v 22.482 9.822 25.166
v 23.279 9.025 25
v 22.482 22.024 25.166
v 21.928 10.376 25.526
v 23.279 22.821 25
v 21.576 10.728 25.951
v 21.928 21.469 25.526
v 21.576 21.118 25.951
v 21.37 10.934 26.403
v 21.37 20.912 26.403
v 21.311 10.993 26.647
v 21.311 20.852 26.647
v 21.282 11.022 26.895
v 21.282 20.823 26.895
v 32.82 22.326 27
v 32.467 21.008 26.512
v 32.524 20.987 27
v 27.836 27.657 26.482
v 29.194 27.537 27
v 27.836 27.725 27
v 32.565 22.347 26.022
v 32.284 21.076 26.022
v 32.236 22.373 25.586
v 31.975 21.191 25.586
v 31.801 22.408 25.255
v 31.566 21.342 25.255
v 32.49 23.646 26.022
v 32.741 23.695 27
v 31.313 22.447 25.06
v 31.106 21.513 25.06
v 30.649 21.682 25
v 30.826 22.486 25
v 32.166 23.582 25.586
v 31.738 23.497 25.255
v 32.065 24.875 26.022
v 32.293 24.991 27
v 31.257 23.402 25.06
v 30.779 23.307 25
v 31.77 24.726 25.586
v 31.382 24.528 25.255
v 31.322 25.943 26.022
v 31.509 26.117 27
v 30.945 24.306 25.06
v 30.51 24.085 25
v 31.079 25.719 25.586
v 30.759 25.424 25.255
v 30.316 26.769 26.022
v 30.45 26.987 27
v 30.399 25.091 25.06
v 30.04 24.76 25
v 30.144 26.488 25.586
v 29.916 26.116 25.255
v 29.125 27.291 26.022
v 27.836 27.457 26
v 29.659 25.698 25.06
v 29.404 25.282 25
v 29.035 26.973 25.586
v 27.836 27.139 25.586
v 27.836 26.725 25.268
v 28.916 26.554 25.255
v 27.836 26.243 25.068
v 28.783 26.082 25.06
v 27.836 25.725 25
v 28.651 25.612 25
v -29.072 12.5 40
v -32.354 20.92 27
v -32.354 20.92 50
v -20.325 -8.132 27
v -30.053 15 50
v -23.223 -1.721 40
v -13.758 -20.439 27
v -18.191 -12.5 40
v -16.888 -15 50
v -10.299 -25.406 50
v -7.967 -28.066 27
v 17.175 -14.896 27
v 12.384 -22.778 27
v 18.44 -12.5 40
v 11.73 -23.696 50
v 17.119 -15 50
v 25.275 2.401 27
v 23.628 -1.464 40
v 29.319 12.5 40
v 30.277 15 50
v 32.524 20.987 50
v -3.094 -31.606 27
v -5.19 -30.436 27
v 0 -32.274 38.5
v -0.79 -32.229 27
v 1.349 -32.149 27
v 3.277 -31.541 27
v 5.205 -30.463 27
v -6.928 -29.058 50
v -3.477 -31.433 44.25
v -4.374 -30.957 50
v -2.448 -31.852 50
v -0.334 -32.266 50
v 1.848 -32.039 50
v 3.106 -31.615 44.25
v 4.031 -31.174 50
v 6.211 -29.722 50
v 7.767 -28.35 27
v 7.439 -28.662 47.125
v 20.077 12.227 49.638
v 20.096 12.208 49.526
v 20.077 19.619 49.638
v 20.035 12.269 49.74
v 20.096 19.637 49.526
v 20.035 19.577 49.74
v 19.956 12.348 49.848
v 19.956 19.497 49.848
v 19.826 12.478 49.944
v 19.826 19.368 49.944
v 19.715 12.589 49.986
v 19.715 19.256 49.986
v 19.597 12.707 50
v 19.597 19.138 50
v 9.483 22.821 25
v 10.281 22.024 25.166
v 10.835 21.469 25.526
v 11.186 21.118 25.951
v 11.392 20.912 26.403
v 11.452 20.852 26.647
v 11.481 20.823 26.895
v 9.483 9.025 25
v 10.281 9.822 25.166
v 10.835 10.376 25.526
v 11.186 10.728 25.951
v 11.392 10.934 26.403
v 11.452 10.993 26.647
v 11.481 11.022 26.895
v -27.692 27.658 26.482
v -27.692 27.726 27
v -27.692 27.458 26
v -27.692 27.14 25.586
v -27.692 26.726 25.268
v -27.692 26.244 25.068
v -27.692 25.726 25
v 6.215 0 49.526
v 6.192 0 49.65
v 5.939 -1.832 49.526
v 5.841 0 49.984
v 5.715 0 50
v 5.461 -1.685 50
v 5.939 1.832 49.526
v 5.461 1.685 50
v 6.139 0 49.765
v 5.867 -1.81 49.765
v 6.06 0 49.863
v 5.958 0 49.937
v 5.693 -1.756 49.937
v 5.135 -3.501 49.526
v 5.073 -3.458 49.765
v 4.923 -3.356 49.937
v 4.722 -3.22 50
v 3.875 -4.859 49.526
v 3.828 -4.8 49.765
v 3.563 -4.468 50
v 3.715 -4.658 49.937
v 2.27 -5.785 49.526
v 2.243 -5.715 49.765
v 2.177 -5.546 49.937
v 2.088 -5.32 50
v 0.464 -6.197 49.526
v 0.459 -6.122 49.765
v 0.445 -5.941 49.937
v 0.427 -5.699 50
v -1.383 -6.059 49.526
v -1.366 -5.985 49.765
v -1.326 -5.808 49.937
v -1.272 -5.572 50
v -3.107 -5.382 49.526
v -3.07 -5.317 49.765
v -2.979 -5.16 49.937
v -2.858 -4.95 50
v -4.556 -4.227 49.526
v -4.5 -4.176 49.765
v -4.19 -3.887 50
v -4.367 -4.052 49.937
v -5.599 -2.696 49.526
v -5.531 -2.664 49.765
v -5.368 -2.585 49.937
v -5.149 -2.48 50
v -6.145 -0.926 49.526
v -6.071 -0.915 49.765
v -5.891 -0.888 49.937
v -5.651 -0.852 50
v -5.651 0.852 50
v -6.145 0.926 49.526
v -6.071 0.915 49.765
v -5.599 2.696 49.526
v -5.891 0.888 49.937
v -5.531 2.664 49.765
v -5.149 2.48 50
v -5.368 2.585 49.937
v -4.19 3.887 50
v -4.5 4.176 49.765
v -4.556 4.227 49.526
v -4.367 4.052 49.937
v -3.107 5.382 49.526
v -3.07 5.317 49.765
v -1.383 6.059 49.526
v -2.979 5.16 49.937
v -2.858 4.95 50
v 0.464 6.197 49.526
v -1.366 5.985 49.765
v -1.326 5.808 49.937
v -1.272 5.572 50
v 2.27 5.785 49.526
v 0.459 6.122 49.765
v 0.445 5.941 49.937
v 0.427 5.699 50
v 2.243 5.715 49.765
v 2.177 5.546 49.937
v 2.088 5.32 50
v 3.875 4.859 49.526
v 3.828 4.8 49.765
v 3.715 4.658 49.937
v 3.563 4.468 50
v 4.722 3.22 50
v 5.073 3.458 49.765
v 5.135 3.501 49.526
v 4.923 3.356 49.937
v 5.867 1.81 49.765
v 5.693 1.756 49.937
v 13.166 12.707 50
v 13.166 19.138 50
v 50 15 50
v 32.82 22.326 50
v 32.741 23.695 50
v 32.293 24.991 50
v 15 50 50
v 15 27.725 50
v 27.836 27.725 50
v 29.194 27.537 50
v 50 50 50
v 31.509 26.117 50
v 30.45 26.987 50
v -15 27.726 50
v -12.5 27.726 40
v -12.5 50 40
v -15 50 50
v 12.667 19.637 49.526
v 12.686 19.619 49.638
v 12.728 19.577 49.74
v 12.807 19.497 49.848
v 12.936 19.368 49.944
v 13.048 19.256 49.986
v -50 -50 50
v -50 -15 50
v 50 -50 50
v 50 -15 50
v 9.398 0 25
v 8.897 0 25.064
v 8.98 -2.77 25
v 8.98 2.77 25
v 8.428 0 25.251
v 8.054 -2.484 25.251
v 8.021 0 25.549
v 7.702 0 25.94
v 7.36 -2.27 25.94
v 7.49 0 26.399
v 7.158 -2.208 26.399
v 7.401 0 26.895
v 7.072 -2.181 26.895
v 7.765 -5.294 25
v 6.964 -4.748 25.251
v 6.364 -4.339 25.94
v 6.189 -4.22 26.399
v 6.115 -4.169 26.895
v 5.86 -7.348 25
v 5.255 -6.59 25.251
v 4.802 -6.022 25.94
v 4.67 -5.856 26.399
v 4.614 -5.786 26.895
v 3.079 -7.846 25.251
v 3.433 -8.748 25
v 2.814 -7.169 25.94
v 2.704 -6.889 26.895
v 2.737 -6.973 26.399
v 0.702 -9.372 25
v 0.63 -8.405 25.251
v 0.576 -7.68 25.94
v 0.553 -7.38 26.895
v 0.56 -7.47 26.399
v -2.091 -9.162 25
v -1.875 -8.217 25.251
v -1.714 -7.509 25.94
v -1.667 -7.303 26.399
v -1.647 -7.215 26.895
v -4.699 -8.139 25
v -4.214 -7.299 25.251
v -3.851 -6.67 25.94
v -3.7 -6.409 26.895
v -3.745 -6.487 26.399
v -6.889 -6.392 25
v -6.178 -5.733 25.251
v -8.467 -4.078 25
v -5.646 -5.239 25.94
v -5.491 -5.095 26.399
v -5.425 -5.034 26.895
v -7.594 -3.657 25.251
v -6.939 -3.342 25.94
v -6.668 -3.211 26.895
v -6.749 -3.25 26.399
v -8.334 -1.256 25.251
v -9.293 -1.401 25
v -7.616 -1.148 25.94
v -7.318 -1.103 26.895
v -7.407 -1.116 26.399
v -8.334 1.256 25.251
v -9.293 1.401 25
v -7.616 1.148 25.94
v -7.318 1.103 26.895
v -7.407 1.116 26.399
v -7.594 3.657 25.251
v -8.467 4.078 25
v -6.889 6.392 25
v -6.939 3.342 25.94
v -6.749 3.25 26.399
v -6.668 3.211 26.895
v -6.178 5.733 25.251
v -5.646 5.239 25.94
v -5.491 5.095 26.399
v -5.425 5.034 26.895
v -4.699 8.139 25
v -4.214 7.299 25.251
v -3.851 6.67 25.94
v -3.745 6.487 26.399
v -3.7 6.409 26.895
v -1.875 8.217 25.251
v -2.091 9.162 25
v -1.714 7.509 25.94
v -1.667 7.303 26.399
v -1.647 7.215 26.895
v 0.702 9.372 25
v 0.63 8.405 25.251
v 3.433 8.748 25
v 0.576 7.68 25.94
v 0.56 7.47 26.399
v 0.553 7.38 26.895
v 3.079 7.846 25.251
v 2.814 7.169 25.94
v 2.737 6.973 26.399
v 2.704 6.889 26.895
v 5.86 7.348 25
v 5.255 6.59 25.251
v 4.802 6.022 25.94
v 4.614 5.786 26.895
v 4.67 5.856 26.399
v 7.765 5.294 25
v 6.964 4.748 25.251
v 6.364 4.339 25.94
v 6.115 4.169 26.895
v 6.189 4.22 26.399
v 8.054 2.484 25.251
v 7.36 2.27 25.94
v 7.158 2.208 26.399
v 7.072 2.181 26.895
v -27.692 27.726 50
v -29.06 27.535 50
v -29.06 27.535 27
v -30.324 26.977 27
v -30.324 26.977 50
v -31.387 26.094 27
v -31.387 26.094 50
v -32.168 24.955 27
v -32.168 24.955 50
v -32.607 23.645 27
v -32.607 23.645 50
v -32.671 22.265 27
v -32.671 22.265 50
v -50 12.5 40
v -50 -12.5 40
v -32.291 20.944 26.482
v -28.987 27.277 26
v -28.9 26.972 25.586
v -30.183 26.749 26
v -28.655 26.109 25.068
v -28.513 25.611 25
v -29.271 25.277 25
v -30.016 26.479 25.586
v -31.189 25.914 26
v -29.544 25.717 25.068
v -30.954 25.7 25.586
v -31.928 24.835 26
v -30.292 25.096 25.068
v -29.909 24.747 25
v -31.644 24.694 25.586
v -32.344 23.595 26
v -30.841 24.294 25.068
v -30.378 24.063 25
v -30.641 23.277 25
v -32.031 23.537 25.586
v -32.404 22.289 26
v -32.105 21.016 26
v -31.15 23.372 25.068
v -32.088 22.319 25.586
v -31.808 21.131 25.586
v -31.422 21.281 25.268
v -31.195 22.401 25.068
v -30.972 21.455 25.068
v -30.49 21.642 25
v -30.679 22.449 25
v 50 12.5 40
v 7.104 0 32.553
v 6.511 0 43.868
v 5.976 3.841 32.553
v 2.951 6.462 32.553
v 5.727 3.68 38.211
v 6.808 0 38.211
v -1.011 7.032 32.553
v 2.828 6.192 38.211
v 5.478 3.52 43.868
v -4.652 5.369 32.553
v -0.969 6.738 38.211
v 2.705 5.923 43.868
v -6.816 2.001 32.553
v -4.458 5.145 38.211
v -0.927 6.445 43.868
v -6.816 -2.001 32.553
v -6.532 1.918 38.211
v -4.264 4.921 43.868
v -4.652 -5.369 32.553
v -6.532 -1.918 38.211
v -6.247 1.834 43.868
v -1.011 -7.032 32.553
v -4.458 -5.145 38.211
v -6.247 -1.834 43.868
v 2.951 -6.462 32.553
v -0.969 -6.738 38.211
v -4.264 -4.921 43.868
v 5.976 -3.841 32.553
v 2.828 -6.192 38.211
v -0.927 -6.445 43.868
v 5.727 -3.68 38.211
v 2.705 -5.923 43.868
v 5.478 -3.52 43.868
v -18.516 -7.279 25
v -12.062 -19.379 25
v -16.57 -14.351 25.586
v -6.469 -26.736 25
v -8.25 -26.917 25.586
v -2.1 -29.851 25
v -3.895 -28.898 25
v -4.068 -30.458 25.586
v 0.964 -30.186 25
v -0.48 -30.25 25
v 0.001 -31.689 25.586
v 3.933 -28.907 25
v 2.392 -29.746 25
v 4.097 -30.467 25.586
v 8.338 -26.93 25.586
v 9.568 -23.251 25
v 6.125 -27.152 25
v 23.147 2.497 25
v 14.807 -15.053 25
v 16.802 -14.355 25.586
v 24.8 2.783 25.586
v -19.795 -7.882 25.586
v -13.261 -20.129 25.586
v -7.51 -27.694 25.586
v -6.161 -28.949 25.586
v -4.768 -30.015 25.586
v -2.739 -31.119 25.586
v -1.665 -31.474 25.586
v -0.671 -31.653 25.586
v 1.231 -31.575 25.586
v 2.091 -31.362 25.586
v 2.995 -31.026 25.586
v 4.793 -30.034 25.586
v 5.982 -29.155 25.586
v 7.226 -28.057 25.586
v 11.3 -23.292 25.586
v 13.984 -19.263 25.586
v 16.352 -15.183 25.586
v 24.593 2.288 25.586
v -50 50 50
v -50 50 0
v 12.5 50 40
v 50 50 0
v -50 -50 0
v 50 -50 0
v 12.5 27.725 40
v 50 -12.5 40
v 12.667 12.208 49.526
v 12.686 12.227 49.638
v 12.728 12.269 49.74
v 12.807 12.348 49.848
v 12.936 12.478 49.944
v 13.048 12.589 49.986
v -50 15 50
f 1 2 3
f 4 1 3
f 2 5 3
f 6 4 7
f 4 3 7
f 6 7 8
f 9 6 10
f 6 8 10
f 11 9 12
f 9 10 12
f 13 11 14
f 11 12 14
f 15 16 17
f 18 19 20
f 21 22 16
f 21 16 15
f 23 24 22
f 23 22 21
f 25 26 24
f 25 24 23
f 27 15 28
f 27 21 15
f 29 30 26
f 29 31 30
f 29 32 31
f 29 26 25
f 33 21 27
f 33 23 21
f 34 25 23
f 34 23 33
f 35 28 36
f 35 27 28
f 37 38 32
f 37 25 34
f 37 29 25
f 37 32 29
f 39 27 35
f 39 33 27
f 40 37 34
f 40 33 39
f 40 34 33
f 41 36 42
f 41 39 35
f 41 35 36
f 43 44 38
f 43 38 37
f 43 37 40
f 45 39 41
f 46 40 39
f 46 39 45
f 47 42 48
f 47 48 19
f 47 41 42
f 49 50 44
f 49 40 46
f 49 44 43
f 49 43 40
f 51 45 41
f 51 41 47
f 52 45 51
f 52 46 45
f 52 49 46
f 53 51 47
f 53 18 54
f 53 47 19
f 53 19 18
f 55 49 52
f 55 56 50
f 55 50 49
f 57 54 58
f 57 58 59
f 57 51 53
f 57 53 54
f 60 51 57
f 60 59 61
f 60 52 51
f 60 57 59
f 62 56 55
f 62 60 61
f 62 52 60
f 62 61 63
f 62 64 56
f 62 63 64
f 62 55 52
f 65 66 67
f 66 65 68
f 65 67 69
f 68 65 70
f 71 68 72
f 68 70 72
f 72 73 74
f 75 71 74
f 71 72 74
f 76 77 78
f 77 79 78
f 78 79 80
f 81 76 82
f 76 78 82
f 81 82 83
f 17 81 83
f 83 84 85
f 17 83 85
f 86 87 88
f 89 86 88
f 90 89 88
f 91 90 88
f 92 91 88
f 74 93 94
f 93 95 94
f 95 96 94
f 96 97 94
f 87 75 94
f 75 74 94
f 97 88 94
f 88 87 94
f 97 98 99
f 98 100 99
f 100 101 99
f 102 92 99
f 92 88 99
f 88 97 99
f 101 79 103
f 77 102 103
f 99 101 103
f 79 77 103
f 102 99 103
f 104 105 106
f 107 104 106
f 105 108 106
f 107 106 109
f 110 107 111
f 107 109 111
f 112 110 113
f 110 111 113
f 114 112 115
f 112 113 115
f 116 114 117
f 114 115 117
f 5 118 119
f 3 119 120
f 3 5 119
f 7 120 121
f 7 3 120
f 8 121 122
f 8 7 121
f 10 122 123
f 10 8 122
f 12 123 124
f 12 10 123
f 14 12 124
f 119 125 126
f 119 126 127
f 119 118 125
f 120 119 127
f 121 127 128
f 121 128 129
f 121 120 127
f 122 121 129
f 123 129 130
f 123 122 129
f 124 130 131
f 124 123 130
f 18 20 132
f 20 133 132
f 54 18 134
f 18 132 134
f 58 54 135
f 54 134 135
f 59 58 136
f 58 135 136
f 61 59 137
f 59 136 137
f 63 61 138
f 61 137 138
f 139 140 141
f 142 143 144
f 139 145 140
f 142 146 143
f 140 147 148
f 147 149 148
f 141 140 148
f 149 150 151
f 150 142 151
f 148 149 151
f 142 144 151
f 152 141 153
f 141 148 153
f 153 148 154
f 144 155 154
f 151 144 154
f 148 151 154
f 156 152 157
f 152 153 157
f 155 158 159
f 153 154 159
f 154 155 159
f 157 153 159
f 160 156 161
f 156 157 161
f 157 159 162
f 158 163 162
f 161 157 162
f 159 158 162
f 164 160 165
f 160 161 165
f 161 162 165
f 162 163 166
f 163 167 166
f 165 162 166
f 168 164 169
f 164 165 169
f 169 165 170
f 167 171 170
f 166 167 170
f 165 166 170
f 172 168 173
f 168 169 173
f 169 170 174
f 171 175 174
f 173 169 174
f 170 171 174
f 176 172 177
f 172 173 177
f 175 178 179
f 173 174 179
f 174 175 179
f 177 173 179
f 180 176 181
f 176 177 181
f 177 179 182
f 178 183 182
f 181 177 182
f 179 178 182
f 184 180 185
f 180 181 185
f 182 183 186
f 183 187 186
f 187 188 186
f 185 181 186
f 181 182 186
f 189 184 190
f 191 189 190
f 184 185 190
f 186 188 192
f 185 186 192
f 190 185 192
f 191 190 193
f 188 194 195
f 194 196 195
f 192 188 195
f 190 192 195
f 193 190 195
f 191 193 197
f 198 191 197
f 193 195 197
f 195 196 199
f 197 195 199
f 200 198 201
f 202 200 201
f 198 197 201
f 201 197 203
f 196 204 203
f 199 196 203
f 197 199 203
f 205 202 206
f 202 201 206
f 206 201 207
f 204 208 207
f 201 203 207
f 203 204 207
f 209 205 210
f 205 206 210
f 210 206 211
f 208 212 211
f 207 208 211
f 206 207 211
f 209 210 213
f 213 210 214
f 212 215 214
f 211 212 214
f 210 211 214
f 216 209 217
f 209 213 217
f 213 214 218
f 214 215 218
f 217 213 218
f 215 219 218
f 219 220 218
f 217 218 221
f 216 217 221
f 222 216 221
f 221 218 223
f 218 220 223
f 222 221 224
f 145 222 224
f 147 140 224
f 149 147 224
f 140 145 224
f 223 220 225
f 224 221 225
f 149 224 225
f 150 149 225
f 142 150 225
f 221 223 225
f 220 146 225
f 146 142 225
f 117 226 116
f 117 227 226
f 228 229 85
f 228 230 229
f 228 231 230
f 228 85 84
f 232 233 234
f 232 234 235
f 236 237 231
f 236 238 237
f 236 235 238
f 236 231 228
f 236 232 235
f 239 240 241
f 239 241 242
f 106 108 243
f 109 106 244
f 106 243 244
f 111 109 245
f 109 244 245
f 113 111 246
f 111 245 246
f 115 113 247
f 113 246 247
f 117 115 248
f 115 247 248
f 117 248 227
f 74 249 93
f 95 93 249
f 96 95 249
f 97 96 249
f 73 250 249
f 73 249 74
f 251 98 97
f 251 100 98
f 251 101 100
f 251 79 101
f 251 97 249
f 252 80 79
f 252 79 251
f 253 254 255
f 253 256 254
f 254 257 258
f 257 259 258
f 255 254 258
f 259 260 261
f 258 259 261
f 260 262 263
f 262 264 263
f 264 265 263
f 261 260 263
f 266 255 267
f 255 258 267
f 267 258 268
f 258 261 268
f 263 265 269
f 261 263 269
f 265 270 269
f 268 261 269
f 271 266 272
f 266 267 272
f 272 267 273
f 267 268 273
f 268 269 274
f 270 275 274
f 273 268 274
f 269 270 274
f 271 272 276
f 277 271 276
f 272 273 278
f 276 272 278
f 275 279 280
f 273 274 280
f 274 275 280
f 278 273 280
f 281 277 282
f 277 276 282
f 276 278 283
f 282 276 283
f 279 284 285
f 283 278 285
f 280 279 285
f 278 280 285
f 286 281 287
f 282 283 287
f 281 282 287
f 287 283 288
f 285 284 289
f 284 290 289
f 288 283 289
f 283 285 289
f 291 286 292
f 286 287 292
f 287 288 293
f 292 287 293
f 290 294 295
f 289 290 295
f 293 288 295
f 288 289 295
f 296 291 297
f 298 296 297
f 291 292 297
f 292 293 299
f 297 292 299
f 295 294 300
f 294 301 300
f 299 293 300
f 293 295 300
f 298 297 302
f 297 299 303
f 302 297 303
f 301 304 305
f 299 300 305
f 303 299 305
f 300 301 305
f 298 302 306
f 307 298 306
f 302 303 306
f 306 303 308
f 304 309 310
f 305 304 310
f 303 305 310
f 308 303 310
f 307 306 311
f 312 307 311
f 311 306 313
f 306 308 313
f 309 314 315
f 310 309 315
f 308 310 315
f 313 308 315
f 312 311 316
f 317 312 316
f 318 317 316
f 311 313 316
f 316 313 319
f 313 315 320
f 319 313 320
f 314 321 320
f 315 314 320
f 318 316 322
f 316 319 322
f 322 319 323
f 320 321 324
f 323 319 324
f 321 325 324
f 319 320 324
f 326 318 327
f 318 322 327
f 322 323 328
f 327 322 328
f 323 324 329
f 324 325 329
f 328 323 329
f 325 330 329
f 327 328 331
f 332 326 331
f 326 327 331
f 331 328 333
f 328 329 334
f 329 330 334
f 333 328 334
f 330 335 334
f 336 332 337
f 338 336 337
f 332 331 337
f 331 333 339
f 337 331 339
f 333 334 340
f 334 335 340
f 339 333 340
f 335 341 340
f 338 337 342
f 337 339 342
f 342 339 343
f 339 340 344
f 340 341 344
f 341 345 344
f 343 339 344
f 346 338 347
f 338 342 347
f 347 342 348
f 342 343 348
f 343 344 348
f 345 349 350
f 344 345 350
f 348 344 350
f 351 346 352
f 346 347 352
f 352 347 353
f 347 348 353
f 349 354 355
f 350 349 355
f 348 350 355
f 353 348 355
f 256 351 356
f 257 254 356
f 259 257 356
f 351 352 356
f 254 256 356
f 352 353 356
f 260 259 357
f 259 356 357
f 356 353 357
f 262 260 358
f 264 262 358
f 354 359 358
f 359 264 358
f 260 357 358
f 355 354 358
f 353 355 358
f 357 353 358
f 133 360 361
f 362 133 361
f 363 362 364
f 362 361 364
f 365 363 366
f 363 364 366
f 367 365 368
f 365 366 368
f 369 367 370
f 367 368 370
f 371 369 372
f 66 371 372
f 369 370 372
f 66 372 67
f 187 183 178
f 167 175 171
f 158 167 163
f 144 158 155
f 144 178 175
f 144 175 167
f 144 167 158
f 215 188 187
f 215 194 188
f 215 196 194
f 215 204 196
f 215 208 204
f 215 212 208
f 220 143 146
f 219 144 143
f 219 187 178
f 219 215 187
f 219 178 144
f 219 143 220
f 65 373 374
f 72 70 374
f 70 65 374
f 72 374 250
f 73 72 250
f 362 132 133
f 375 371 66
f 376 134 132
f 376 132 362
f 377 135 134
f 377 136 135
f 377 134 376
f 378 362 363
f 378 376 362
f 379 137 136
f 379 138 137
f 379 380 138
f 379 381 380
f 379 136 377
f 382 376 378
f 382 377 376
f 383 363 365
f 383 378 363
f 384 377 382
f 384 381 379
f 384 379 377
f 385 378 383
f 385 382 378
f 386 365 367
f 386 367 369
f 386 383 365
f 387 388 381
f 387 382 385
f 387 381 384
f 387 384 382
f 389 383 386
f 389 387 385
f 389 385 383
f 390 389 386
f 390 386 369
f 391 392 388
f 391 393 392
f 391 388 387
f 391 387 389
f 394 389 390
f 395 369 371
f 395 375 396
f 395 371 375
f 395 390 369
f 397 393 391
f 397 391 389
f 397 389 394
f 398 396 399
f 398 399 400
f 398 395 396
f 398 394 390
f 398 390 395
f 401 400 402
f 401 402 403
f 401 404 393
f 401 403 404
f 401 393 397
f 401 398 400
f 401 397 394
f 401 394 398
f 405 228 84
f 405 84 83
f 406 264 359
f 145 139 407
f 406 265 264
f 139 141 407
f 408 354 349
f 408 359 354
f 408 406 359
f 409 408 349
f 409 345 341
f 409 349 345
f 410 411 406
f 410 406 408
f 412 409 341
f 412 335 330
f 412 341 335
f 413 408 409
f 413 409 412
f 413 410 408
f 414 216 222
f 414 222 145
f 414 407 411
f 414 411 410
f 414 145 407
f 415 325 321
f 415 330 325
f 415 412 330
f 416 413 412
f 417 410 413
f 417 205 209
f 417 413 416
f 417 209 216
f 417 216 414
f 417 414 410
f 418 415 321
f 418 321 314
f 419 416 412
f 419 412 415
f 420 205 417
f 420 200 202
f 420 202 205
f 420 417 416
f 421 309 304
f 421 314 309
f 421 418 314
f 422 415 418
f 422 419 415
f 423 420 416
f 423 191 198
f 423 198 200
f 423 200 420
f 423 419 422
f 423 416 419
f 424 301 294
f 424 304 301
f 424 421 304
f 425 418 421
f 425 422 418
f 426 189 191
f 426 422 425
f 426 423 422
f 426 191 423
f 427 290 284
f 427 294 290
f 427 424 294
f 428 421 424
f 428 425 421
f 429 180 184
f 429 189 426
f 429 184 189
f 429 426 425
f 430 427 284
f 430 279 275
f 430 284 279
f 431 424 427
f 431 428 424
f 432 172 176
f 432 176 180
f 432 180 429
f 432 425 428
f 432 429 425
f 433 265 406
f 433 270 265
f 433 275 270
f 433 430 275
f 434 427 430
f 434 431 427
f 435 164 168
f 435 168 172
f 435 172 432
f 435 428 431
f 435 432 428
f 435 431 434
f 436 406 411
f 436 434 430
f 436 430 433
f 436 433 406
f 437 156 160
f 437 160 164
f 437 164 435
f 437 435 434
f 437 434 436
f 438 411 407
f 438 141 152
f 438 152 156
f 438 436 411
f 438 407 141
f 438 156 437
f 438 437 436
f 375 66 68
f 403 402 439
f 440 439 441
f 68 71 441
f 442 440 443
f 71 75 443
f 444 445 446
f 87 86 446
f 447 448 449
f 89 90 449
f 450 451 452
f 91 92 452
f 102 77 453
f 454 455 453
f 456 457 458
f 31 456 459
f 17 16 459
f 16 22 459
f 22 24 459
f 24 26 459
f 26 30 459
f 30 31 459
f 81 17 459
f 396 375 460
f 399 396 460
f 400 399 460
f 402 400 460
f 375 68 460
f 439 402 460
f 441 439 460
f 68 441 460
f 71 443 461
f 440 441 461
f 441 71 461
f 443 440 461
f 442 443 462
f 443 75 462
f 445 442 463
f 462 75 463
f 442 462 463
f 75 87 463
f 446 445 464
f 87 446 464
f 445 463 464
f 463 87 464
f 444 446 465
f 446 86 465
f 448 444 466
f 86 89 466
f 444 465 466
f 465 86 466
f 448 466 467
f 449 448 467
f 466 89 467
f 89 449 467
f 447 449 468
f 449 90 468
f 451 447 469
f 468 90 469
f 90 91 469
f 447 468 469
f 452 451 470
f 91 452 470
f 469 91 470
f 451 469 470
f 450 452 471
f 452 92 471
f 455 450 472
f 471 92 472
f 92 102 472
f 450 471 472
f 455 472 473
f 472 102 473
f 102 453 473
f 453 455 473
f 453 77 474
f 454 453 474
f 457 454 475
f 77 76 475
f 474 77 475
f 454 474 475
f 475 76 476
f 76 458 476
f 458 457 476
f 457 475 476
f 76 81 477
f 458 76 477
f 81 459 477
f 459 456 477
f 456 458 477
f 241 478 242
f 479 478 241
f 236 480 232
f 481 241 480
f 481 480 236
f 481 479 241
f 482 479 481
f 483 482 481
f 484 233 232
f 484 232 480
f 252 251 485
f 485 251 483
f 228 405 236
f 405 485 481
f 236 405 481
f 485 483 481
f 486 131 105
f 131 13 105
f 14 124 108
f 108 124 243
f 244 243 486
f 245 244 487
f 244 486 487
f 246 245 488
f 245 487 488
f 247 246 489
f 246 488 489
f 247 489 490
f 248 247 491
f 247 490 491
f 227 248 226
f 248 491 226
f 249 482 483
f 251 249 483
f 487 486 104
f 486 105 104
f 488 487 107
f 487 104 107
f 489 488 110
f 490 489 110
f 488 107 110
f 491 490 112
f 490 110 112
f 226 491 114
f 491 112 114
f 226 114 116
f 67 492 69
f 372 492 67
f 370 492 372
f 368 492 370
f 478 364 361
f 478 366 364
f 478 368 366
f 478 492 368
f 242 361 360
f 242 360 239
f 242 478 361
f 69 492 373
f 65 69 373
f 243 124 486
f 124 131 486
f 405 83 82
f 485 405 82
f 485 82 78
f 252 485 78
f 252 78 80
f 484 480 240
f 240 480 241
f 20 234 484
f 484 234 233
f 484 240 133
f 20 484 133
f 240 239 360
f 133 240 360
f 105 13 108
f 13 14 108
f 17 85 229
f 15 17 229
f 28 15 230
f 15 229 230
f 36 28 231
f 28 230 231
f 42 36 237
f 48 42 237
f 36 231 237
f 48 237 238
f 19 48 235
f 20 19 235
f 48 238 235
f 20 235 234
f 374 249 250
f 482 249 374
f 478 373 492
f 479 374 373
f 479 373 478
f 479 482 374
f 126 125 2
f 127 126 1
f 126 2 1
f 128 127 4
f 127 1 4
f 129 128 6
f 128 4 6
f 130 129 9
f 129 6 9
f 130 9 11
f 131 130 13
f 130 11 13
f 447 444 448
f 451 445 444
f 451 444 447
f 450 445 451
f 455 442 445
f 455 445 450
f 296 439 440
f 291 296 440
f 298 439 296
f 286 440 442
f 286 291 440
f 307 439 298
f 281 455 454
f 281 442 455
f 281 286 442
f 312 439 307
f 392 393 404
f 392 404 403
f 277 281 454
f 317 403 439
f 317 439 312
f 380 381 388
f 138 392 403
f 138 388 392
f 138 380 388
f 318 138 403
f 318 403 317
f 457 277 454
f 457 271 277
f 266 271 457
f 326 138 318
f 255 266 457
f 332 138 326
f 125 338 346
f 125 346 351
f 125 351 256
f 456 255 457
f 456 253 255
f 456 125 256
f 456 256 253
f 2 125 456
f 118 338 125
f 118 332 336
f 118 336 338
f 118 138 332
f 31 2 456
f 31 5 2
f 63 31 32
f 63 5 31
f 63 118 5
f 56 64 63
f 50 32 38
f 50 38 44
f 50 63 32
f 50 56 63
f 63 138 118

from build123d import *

# Parameters (mm, degrees)
F0_W     = 100
F0_H     = 100
F1_DEPTH = 50
F3_DEPTH = 25
F5_DEPTH = 22.275646797
F7_DEPTH = 100
F8_R     = 7.5
F8_W     = 10
F8_H     = 10
F9_DEPTH = 25
F9_TAPER = 3
F10_R    = 2
F11_R    = 0.5
F12_R    = 0.5


with BuildPart() as f1:
    # F0 (on Top) → F1 (new body)
    with BuildSketch(Plane.XY):
        Rectangle(F0_W, F0_H)
    extrude(amount=F1_DEPTH)

    # F2 (on face) → F3 (cut)
    with BuildSketch(Plane.XY.offset(50)):
        with BuildLine():
            ThreePointArc((-27.6920917798, 27.7259293121), (-31.8171440994, 25.5516150722), (-32.3544992545, 20.9196664012))
            add(Edge.make_bspline(
                [(-32.3544992545, 20.9196664012), (-23.103090057, -2.9601436233), (-0.2425590805, -61.5865364676), (23.6450097648, -2.9646096828), (32.5238265853, 20.9872745586)],
                knots=[0.0444691943, 0.0444691943, 0.0444691943, 0.0444691943, 0.5000014683, 0.9560875796, 0.9560875796, 0.9560875796, 0.9560875796], degree=3))
            ThreePointArc((32.5238265853, 20.9872745586), (31.9398334839, 25.5808897558), (27.8356444162, 27.7251799922))
            Line((27.8356444162, 27.7251799922), (-27.6920917798, 27.7259293121))
        make_face()
    extrude(amount=-F3_DEPTH, mode=Mode.SUBTRACT)

    # F4 (on face) → F5 (cut, through all)
    with BuildSketch(Plane(origin=(0, 50, 0), x_dir=(-1, 0, 0), z_dir=(0, 1, 0))):
        Polygon((15, 50), (-15, 50), (-12.5, 40), (12.5, 40), align=None)
    extrude(amount=-F5_DEPTH, mode=Mode.SUBTRACT)

    # F6 (on face) → F7 (cut)
    with BuildSketch(Plane(origin=(-50, 0, 0), x_dir=(0, -1, 0), z_dir=(-1, 0, 0))):
        Polygon((15, 50), (-15, 50), (-12.5, 40), (12.5, 40), align=None)
    extrude(amount=-F7_DEPTH, mode=Mode.SUBTRACT)

    # F8 (on face) → F9 (join)
    with BuildSketch(Plane.XY.offset(25)):
        Circle(F8_R)
        with Locations((16.3814044744, 15.9227793291)):
            Rectangle(F8_W, F8_H)
    extrude(amount=F9_DEPTH, taper=F9_TAPER)

    # F10
    f10_edges = [f1.edges().sort_by_distance(p)[0] for p in [
        (0.071776, 27.725555, 25),
        (31.939833, 25.58089, 25),
        (-31.817144, 25.551615, 25),
        (0.102186, -32.273864, 25),
        (-7.5, 0, 25),
        (11.381404, 15.922779, 25),
        (16.381404, 10.922779, 25),
        (21.381404, 15.922779, 25),
        (16.381404, 20.922779, 25),
    ]]
    fillet(f10_edges, radius=F10_R)

    # F11
    f11_edges = [f1.edges().sort_by_distance(p)[0] for p in [
        (-6.189806, 0, 50),
    ]]
    fillet(f11_edges, radius=F11_R)

    # F12
    f12_edges = [f1.edges().sort_by_distance(p)[0] for p in [
        (16.381404, 12.232974, 50),
        (12.691599, 15.922779, 50),
        (16.381404, 19.612585, 50),
        (20.07121, 15.922779, 50),
    ]]
    fillet(f12_edges, radius=F12_R)


solid = f1.part
